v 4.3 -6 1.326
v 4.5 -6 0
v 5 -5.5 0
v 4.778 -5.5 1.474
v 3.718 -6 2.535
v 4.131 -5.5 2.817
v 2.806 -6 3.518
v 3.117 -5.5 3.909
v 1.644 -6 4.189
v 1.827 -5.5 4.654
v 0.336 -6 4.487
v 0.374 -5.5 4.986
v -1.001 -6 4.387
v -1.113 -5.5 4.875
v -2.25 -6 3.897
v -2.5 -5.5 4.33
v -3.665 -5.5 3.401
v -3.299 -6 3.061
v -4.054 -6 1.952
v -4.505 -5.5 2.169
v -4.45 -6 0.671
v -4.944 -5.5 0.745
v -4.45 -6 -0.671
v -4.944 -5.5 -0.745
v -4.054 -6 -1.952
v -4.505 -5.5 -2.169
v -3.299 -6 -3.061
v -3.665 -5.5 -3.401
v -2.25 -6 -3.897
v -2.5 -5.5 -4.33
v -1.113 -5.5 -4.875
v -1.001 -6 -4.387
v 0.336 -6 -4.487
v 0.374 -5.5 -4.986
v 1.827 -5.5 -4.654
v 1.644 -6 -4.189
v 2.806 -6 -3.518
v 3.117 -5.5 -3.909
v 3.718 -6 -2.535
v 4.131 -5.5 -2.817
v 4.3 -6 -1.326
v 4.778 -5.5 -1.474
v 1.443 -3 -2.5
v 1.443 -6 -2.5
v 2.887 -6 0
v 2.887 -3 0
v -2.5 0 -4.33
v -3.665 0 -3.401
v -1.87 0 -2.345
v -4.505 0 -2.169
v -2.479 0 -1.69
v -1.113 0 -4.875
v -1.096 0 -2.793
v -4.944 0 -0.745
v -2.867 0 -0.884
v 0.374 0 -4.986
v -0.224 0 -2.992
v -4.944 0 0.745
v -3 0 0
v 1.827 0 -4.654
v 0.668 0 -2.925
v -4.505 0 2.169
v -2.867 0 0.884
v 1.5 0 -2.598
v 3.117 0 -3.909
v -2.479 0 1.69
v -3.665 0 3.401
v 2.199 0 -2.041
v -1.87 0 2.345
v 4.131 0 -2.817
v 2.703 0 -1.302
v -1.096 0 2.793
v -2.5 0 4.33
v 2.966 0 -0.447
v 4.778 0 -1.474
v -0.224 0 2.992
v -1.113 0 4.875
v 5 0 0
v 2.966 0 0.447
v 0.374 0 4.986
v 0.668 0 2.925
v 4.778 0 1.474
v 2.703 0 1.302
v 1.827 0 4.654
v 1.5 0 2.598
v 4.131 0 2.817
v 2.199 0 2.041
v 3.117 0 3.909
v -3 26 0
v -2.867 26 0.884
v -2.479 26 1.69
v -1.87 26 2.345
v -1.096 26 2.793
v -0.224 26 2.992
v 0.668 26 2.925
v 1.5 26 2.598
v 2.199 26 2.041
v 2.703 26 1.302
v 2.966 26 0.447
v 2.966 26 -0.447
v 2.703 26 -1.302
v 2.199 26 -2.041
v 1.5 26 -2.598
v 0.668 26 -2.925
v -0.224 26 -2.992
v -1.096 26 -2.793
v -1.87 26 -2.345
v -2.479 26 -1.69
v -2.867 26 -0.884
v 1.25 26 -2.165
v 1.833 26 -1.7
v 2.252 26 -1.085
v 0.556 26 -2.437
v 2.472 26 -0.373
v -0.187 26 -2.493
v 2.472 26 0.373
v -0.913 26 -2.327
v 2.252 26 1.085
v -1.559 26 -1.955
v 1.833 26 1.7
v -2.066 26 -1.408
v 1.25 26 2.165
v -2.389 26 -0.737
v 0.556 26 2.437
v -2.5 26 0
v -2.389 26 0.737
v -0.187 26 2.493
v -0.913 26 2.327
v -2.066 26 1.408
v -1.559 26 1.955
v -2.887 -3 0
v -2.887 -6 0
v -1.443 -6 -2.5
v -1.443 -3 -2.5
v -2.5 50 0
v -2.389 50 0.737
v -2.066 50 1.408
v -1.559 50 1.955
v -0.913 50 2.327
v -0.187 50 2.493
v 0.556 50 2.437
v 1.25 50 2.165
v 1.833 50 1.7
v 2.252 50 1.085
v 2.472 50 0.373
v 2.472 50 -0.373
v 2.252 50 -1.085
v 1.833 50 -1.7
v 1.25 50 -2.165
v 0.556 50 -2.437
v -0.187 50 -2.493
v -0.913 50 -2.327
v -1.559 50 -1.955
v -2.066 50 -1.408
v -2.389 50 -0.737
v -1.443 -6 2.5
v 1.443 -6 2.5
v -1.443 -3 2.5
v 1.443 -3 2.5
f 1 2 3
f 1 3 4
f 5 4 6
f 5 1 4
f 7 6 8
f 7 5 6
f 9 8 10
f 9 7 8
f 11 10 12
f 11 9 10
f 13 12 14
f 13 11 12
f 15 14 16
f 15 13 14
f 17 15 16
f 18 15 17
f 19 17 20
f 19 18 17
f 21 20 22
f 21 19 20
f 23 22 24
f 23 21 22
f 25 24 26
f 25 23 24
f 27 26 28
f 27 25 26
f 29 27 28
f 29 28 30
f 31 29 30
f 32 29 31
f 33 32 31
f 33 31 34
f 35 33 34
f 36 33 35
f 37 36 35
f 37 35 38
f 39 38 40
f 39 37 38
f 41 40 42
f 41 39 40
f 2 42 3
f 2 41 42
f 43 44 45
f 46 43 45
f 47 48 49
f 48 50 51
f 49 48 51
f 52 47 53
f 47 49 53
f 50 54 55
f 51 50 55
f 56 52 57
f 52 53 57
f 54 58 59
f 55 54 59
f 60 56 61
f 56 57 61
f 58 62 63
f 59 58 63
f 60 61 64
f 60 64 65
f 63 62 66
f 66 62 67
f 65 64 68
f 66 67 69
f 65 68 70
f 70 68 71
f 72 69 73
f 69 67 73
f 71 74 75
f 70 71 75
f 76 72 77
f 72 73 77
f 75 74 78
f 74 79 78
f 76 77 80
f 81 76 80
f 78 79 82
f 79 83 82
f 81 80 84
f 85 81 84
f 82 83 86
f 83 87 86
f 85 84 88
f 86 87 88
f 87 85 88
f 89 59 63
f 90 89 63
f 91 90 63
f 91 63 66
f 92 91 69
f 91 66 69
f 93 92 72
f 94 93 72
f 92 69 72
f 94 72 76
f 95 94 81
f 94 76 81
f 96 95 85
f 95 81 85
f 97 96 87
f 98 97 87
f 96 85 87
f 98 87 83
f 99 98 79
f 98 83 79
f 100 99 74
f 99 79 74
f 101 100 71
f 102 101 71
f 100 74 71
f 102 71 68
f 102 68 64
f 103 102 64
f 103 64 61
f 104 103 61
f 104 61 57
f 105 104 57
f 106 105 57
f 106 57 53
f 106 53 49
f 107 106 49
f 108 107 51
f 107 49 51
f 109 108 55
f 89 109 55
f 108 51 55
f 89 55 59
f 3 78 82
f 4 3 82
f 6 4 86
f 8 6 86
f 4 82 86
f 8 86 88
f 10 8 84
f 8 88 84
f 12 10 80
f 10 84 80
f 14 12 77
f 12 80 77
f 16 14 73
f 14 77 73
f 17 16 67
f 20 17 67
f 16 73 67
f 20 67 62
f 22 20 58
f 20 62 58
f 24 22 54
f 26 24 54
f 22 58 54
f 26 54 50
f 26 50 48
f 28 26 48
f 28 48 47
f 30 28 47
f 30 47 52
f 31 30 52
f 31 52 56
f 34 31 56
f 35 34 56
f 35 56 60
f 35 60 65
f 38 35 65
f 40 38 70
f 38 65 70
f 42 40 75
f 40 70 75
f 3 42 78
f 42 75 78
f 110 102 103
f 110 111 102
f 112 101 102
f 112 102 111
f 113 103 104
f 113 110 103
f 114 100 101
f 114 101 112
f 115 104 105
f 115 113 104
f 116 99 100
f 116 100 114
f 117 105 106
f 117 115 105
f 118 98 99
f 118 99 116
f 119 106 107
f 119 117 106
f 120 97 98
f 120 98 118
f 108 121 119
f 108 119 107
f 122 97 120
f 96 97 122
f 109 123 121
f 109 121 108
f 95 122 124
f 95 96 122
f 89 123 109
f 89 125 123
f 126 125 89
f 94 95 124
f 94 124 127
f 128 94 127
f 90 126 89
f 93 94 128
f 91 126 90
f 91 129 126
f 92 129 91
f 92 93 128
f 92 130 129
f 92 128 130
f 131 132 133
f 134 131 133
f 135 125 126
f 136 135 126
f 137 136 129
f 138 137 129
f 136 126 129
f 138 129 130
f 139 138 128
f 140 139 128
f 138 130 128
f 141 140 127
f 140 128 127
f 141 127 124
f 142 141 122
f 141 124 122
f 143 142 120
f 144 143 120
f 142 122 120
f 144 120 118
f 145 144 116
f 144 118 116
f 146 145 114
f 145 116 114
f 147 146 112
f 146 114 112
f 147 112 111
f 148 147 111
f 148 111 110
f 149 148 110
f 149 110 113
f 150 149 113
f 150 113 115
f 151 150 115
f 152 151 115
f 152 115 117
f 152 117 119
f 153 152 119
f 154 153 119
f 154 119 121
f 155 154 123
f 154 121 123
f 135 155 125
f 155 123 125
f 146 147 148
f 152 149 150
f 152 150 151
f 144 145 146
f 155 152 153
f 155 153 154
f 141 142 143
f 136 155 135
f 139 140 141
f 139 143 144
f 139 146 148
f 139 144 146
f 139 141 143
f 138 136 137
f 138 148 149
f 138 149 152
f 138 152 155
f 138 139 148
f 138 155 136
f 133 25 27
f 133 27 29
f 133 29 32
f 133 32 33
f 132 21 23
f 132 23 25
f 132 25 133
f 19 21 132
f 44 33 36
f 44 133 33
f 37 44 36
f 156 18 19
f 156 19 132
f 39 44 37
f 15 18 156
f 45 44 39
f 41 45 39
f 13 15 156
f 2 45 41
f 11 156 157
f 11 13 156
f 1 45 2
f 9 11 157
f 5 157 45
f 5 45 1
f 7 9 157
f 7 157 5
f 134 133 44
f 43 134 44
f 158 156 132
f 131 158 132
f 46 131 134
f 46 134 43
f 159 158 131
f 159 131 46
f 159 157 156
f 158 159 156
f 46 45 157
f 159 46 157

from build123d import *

# Parameters (mm, degrees)
F0_R     = 5
F1_DEPTH = 6
F2_R     = 3
F3_DEPTH = 26
F4_R     = 2.5
F5_DEPTH = 24
F7_DEPTH = 3
F8_SIZE  = 0.5


with BuildPart() as f1:
    # F0 (on Front) → F1 (new body)
    with BuildSketch(Plane.XZ):
        Circle(F0_R)
    extrude(amount=F1_DEPTH)

    # F2 (on face) → F3 (join)
    with BuildSketch(Plane(origin=(0, 0, 0), x_dir=(-1, 0, 0), z_dir=(0, 1, 0))):
        Circle(F2_R)
    extrude(amount=F3_DEPTH)

    # F4 (on face) → F5 (join)
    with BuildSketch(Plane(origin=(0, 26, 0), x_dir=(-1, 0, 0), z_dir=(0, 1, 0))):
        Circle(F4_R)
    extrude(amount=F5_DEPTH)

    # F6 (on face) → F7 (cut)
    with BuildSketch(Plane.XZ.offset(6)):
        Polygon((1.443376, 2.5), (-1.443376, 2.5), (-2.886751, 0), (-1.443376, -2.5), (1.443376, -2.5), (2.886751, 0), align=None)
    extrude(amount=-F7_DEPTH, mode=Mode.SUBTRACT)

    # F8
    f8_edges = [f1.edges().sort_by_distance(p)[0] for p in [
        (-5, -6, 0),
    ]]
    chamfer(f8_edges, length=F8_SIZE)


solid = f1.part
